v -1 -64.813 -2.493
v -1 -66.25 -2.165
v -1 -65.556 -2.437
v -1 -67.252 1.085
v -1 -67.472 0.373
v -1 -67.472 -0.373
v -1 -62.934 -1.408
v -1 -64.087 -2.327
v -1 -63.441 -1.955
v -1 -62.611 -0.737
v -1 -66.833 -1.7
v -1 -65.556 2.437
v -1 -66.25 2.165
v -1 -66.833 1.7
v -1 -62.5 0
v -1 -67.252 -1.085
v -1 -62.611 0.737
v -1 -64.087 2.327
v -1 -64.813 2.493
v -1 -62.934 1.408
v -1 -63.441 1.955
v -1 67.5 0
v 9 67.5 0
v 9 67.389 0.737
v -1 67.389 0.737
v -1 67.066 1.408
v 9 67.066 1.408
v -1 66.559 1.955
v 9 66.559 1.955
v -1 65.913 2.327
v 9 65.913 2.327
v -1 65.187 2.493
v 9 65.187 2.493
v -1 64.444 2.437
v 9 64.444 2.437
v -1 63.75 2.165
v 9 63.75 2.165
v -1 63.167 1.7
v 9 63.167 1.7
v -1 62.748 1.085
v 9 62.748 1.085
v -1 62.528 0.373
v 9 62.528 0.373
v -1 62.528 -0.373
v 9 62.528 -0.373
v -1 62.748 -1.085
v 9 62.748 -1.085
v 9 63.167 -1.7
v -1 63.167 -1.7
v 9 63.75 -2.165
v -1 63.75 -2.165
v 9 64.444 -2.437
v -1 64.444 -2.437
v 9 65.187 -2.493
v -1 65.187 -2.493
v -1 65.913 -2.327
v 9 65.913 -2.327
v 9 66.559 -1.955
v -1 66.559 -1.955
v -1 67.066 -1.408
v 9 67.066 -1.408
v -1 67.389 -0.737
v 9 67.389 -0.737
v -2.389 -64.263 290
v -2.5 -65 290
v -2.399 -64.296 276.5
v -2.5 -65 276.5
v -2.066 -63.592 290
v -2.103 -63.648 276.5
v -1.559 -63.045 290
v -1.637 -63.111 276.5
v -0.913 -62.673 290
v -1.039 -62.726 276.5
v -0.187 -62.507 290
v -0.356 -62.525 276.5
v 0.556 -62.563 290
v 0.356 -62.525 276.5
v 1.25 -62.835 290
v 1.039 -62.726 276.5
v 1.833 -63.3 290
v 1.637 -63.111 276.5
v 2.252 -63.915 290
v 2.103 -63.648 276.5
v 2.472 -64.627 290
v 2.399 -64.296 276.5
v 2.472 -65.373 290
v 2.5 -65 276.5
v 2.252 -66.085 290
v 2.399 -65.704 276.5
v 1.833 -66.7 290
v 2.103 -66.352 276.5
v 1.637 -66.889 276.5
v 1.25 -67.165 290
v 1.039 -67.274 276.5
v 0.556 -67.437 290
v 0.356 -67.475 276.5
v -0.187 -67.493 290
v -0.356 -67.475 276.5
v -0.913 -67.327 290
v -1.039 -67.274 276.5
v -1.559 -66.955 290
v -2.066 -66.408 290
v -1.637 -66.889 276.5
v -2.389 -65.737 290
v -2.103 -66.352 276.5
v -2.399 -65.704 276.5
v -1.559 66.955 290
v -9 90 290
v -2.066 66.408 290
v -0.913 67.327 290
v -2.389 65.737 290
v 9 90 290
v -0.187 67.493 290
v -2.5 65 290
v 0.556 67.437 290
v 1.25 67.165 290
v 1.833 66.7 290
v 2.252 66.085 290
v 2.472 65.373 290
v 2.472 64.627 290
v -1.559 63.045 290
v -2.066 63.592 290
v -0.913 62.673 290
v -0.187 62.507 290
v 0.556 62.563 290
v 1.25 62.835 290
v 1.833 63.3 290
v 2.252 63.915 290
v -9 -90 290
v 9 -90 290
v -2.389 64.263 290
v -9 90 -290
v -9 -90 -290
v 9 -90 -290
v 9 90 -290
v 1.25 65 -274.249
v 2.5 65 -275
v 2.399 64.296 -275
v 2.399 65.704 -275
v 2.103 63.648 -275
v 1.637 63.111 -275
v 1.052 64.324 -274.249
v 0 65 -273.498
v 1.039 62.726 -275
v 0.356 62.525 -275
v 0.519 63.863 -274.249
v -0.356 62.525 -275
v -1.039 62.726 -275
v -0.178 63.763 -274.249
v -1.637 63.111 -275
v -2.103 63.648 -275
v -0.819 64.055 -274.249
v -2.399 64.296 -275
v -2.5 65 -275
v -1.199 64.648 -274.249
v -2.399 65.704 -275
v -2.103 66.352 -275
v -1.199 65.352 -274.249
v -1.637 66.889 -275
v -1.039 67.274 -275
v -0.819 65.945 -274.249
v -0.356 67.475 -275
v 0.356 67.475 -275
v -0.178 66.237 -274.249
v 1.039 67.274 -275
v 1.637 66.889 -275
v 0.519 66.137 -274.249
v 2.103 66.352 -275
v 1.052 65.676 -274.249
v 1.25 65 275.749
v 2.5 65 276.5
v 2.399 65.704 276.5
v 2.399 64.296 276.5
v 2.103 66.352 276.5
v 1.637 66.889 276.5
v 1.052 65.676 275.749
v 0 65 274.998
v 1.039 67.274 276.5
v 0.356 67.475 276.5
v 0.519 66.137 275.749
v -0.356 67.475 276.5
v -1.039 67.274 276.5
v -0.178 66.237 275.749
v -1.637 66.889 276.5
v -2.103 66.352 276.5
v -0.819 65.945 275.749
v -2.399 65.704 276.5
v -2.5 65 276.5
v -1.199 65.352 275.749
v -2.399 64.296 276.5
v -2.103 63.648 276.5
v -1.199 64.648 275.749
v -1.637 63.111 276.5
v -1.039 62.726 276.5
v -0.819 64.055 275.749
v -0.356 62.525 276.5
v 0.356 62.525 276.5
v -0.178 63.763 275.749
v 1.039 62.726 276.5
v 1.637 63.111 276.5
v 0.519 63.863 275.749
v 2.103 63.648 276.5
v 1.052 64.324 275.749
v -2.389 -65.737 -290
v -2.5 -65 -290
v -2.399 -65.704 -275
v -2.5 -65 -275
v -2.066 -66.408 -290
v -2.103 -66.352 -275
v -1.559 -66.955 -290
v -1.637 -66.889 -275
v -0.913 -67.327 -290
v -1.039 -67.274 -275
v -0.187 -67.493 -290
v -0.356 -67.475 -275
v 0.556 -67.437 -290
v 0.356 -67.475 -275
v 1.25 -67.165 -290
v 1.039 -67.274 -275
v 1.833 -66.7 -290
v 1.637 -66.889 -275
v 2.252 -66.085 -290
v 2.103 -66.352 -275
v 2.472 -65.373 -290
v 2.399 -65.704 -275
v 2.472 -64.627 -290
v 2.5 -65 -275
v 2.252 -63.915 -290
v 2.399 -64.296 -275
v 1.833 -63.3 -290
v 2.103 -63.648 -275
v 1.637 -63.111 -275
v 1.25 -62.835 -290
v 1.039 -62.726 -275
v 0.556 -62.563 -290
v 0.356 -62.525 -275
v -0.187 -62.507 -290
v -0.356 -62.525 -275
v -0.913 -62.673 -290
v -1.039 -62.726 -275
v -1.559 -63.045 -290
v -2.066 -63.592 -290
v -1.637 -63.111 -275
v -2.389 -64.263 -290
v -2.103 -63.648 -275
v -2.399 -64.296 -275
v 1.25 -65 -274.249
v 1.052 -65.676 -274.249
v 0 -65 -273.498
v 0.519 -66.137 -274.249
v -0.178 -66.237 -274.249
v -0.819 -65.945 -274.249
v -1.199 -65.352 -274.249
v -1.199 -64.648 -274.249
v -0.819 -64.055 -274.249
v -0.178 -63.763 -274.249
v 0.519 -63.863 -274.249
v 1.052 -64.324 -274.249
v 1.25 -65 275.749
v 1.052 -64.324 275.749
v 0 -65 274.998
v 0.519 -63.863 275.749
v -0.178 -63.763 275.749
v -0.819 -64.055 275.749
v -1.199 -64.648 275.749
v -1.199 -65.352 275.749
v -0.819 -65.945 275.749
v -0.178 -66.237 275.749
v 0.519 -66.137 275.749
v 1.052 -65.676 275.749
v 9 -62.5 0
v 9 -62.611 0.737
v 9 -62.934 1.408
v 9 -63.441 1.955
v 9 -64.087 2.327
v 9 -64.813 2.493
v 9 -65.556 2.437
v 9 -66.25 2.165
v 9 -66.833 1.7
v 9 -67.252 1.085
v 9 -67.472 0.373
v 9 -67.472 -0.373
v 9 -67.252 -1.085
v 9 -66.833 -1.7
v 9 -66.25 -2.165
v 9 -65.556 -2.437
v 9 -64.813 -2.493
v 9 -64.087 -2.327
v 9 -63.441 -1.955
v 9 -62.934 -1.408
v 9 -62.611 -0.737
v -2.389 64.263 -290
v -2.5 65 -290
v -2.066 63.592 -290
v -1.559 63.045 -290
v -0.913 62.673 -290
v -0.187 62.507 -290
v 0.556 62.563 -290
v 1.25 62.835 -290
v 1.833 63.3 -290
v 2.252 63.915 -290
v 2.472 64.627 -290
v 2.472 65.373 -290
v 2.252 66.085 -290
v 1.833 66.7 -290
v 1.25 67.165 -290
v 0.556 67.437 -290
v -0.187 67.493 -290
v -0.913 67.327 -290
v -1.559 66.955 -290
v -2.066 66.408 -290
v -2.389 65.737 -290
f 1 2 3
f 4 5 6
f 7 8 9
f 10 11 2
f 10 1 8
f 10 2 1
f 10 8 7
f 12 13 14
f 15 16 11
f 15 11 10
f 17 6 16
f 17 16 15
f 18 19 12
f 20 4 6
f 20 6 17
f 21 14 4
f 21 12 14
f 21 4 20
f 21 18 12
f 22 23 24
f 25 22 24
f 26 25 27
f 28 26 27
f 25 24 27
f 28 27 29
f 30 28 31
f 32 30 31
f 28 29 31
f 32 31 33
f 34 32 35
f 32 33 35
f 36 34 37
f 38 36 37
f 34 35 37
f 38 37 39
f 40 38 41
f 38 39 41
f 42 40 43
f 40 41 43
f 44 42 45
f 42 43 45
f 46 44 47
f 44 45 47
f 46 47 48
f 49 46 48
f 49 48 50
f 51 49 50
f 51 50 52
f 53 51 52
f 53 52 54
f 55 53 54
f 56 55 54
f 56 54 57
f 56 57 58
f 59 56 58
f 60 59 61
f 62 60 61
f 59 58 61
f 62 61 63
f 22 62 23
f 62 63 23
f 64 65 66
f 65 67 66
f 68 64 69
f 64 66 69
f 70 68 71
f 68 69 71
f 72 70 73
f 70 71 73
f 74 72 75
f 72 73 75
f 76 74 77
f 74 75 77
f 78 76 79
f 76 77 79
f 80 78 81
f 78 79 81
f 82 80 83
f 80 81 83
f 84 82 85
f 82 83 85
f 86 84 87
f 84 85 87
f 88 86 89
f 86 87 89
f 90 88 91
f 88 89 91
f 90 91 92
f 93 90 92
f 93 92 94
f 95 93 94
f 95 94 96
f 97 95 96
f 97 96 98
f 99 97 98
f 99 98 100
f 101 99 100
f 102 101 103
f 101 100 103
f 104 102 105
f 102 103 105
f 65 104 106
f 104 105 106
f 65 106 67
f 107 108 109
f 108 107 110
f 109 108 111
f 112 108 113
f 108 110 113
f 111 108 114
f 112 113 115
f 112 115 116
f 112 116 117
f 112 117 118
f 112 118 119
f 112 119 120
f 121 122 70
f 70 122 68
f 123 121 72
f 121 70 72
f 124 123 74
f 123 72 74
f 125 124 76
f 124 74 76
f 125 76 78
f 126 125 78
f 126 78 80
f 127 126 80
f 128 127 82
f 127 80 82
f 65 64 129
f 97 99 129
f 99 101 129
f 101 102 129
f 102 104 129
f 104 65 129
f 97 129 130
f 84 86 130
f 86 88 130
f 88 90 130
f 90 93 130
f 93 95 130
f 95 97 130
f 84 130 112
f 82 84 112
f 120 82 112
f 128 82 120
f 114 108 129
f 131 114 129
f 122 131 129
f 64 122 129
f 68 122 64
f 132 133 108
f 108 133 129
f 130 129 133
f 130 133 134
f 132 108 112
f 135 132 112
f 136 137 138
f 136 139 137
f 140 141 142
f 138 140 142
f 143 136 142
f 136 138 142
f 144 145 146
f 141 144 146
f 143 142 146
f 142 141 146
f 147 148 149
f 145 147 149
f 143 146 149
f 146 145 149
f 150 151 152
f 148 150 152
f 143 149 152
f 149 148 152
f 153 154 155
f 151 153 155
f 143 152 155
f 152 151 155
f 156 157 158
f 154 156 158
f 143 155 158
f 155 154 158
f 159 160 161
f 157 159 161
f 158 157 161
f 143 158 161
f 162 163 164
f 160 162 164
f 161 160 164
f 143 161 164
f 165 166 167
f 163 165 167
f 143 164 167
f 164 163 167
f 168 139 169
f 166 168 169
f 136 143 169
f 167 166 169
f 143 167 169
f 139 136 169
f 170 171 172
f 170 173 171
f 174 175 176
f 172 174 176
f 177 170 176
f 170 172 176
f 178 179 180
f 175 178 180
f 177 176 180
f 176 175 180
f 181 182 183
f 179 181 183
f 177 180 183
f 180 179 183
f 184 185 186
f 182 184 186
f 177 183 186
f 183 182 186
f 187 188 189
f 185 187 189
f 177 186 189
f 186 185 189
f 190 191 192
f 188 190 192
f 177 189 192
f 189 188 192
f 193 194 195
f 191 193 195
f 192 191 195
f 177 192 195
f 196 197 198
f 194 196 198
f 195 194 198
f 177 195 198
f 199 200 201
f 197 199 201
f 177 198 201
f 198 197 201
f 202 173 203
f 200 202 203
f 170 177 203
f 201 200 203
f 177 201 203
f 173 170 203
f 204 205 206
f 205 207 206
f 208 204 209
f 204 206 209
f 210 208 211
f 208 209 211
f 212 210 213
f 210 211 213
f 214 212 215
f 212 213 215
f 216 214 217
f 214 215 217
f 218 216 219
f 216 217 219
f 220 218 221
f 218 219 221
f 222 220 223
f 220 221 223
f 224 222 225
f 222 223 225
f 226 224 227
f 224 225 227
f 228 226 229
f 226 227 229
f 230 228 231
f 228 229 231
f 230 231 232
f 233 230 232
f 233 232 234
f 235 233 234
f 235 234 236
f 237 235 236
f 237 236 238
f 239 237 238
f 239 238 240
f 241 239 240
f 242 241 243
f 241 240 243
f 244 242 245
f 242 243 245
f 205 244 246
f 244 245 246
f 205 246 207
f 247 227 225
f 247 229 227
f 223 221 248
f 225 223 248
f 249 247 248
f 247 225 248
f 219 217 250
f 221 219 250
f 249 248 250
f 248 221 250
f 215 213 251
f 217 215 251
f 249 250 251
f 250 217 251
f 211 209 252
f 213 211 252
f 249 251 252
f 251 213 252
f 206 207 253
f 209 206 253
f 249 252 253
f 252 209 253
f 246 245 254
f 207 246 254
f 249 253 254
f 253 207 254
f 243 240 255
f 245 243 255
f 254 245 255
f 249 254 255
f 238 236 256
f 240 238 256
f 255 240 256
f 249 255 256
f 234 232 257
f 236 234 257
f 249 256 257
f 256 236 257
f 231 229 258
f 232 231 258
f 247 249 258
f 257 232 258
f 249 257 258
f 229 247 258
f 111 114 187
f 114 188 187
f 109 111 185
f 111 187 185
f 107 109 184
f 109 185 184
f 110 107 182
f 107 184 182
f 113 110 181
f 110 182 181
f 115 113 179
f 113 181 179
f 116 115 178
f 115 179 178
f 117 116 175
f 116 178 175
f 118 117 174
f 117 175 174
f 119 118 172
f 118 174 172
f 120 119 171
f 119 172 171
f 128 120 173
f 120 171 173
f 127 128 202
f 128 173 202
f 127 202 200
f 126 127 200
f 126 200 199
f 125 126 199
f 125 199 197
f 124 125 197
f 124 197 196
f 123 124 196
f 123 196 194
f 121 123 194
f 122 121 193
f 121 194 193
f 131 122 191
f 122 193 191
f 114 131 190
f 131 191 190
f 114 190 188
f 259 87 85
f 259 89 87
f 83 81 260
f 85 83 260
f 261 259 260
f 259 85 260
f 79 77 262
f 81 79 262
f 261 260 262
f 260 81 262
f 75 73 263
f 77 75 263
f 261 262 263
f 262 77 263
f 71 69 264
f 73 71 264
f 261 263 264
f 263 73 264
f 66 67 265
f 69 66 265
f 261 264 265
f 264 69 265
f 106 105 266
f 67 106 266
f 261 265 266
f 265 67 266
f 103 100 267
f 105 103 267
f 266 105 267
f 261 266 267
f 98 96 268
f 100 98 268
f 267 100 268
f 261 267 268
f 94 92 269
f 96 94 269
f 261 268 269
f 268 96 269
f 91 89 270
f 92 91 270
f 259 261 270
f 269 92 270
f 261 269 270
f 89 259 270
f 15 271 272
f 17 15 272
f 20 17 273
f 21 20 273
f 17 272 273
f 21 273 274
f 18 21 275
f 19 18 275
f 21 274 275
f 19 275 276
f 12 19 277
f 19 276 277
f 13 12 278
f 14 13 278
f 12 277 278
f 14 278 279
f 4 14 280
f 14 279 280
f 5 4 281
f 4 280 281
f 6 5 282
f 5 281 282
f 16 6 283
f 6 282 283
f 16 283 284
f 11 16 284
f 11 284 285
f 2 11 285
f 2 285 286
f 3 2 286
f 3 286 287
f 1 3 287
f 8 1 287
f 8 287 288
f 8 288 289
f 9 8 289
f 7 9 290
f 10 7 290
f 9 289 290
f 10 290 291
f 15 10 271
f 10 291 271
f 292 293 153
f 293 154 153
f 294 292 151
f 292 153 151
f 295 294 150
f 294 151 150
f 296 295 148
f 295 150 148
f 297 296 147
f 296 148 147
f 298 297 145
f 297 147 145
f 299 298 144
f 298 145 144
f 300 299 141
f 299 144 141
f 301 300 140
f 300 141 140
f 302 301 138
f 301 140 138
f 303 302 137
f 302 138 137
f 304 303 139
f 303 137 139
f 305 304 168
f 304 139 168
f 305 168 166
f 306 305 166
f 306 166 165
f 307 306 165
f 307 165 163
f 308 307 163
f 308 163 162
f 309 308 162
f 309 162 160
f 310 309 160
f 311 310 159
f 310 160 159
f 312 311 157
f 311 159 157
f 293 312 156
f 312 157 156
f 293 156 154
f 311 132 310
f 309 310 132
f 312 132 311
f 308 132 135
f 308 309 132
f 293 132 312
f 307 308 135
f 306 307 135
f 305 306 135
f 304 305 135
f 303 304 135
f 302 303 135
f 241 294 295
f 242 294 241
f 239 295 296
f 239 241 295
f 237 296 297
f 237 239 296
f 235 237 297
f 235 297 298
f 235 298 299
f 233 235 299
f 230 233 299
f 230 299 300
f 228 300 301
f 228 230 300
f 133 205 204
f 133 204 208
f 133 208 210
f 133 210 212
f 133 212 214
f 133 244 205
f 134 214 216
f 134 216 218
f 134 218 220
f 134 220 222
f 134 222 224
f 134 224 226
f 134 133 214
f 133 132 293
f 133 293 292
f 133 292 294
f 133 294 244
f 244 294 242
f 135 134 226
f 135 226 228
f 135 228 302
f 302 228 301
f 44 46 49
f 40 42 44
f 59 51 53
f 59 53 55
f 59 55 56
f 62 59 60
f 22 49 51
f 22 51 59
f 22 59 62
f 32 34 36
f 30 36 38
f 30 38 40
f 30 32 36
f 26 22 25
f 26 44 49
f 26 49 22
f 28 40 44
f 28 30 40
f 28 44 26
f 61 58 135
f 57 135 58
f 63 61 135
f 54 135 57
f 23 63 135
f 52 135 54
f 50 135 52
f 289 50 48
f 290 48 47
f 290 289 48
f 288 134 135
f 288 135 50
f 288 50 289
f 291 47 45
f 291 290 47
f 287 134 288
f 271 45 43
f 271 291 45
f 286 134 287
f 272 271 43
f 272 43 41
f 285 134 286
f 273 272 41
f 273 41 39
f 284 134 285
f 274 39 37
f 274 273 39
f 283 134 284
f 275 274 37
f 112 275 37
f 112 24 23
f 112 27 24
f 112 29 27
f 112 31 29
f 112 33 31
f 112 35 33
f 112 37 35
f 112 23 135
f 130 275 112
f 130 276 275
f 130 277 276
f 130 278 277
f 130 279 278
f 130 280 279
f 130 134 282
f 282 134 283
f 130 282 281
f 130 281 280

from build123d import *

# Parameters (mm, degrees)
F0_W     = 18
F0_H     = 580
F1_DEPTH = 90
F3_D     = 5
F3_DEPTH = 13.5
F3_TIP   = 1.5021515476
F5_D     = 5
F5_DEPTH = 15
F5_TIP   = 1.5021515476
F6_W     = 180
F6_H     = 580
F6_R     = 2.5
F7_DEPTH = 10
F8_R     = 2.5
F9_DEPTH = 10


with BuildPart() as f1:
    # F0 (on Front) → F1 (new body, symmetric)
    with BuildSketch(Plane.XZ):
        Rectangle(F0_W, F0_H)
    extrude(amount=F1_DEPTH, both=True)

    # F3
    with Locations(Plane.XY.offset(290)):
        with Locations((0, 65), (0, -65)):
            Hole(F3_D / 2, depth=F3_DEPTH)
            with Locations((0, 0, -(F3_DEPTH + F3_TIP / 2))):  # 118° drill point
                Cone(0, F3_D / 2, F3_TIP, mode=Mode.SUBTRACT)

    # F5
    with Locations(Plane(origin=(0, 0, -290), x_dir=(1, 0, 0), z_dir=(0, 0, -1))):
        with Locations((0, 65), (0, -65)):
            Hole(F5_D / 2, depth=F5_DEPTH)
            with Locations((0, 0, -(F5_DEPTH + F5_TIP / 2))):  # 118° drill point
                Cone(0, F5_D / 2, F5_TIP, mode=Mode.SUBTRACT)

    # F6 (on face) → F7 (cut)
    with BuildSketch(Plane.YZ.offset(9)):
        Rectangle(F6_W, F6_H)
        with Locations((-60, 0)):
            Circle(F6_R, mode=Mode.SUBTRACT)
        with Locations((60, 0)):
            Circle(F6_R, mode=Mode.SUBTRACT)
    extrude(amount=F7_DEPTH, mode=Mode.SUBTRACT)

    # F8 (on face) → F9 (cut)
    with BuildSketch(Plane.YZ.offset(9)):
        with Locations((-65, 0)):
            Circle(F8_R)
        with Locations((65, 0)):
            Circle(F8_R)
    extrude(amount=-F9_DEPTH, mode=Mode.SUBTRACT)


solid = f1.part
